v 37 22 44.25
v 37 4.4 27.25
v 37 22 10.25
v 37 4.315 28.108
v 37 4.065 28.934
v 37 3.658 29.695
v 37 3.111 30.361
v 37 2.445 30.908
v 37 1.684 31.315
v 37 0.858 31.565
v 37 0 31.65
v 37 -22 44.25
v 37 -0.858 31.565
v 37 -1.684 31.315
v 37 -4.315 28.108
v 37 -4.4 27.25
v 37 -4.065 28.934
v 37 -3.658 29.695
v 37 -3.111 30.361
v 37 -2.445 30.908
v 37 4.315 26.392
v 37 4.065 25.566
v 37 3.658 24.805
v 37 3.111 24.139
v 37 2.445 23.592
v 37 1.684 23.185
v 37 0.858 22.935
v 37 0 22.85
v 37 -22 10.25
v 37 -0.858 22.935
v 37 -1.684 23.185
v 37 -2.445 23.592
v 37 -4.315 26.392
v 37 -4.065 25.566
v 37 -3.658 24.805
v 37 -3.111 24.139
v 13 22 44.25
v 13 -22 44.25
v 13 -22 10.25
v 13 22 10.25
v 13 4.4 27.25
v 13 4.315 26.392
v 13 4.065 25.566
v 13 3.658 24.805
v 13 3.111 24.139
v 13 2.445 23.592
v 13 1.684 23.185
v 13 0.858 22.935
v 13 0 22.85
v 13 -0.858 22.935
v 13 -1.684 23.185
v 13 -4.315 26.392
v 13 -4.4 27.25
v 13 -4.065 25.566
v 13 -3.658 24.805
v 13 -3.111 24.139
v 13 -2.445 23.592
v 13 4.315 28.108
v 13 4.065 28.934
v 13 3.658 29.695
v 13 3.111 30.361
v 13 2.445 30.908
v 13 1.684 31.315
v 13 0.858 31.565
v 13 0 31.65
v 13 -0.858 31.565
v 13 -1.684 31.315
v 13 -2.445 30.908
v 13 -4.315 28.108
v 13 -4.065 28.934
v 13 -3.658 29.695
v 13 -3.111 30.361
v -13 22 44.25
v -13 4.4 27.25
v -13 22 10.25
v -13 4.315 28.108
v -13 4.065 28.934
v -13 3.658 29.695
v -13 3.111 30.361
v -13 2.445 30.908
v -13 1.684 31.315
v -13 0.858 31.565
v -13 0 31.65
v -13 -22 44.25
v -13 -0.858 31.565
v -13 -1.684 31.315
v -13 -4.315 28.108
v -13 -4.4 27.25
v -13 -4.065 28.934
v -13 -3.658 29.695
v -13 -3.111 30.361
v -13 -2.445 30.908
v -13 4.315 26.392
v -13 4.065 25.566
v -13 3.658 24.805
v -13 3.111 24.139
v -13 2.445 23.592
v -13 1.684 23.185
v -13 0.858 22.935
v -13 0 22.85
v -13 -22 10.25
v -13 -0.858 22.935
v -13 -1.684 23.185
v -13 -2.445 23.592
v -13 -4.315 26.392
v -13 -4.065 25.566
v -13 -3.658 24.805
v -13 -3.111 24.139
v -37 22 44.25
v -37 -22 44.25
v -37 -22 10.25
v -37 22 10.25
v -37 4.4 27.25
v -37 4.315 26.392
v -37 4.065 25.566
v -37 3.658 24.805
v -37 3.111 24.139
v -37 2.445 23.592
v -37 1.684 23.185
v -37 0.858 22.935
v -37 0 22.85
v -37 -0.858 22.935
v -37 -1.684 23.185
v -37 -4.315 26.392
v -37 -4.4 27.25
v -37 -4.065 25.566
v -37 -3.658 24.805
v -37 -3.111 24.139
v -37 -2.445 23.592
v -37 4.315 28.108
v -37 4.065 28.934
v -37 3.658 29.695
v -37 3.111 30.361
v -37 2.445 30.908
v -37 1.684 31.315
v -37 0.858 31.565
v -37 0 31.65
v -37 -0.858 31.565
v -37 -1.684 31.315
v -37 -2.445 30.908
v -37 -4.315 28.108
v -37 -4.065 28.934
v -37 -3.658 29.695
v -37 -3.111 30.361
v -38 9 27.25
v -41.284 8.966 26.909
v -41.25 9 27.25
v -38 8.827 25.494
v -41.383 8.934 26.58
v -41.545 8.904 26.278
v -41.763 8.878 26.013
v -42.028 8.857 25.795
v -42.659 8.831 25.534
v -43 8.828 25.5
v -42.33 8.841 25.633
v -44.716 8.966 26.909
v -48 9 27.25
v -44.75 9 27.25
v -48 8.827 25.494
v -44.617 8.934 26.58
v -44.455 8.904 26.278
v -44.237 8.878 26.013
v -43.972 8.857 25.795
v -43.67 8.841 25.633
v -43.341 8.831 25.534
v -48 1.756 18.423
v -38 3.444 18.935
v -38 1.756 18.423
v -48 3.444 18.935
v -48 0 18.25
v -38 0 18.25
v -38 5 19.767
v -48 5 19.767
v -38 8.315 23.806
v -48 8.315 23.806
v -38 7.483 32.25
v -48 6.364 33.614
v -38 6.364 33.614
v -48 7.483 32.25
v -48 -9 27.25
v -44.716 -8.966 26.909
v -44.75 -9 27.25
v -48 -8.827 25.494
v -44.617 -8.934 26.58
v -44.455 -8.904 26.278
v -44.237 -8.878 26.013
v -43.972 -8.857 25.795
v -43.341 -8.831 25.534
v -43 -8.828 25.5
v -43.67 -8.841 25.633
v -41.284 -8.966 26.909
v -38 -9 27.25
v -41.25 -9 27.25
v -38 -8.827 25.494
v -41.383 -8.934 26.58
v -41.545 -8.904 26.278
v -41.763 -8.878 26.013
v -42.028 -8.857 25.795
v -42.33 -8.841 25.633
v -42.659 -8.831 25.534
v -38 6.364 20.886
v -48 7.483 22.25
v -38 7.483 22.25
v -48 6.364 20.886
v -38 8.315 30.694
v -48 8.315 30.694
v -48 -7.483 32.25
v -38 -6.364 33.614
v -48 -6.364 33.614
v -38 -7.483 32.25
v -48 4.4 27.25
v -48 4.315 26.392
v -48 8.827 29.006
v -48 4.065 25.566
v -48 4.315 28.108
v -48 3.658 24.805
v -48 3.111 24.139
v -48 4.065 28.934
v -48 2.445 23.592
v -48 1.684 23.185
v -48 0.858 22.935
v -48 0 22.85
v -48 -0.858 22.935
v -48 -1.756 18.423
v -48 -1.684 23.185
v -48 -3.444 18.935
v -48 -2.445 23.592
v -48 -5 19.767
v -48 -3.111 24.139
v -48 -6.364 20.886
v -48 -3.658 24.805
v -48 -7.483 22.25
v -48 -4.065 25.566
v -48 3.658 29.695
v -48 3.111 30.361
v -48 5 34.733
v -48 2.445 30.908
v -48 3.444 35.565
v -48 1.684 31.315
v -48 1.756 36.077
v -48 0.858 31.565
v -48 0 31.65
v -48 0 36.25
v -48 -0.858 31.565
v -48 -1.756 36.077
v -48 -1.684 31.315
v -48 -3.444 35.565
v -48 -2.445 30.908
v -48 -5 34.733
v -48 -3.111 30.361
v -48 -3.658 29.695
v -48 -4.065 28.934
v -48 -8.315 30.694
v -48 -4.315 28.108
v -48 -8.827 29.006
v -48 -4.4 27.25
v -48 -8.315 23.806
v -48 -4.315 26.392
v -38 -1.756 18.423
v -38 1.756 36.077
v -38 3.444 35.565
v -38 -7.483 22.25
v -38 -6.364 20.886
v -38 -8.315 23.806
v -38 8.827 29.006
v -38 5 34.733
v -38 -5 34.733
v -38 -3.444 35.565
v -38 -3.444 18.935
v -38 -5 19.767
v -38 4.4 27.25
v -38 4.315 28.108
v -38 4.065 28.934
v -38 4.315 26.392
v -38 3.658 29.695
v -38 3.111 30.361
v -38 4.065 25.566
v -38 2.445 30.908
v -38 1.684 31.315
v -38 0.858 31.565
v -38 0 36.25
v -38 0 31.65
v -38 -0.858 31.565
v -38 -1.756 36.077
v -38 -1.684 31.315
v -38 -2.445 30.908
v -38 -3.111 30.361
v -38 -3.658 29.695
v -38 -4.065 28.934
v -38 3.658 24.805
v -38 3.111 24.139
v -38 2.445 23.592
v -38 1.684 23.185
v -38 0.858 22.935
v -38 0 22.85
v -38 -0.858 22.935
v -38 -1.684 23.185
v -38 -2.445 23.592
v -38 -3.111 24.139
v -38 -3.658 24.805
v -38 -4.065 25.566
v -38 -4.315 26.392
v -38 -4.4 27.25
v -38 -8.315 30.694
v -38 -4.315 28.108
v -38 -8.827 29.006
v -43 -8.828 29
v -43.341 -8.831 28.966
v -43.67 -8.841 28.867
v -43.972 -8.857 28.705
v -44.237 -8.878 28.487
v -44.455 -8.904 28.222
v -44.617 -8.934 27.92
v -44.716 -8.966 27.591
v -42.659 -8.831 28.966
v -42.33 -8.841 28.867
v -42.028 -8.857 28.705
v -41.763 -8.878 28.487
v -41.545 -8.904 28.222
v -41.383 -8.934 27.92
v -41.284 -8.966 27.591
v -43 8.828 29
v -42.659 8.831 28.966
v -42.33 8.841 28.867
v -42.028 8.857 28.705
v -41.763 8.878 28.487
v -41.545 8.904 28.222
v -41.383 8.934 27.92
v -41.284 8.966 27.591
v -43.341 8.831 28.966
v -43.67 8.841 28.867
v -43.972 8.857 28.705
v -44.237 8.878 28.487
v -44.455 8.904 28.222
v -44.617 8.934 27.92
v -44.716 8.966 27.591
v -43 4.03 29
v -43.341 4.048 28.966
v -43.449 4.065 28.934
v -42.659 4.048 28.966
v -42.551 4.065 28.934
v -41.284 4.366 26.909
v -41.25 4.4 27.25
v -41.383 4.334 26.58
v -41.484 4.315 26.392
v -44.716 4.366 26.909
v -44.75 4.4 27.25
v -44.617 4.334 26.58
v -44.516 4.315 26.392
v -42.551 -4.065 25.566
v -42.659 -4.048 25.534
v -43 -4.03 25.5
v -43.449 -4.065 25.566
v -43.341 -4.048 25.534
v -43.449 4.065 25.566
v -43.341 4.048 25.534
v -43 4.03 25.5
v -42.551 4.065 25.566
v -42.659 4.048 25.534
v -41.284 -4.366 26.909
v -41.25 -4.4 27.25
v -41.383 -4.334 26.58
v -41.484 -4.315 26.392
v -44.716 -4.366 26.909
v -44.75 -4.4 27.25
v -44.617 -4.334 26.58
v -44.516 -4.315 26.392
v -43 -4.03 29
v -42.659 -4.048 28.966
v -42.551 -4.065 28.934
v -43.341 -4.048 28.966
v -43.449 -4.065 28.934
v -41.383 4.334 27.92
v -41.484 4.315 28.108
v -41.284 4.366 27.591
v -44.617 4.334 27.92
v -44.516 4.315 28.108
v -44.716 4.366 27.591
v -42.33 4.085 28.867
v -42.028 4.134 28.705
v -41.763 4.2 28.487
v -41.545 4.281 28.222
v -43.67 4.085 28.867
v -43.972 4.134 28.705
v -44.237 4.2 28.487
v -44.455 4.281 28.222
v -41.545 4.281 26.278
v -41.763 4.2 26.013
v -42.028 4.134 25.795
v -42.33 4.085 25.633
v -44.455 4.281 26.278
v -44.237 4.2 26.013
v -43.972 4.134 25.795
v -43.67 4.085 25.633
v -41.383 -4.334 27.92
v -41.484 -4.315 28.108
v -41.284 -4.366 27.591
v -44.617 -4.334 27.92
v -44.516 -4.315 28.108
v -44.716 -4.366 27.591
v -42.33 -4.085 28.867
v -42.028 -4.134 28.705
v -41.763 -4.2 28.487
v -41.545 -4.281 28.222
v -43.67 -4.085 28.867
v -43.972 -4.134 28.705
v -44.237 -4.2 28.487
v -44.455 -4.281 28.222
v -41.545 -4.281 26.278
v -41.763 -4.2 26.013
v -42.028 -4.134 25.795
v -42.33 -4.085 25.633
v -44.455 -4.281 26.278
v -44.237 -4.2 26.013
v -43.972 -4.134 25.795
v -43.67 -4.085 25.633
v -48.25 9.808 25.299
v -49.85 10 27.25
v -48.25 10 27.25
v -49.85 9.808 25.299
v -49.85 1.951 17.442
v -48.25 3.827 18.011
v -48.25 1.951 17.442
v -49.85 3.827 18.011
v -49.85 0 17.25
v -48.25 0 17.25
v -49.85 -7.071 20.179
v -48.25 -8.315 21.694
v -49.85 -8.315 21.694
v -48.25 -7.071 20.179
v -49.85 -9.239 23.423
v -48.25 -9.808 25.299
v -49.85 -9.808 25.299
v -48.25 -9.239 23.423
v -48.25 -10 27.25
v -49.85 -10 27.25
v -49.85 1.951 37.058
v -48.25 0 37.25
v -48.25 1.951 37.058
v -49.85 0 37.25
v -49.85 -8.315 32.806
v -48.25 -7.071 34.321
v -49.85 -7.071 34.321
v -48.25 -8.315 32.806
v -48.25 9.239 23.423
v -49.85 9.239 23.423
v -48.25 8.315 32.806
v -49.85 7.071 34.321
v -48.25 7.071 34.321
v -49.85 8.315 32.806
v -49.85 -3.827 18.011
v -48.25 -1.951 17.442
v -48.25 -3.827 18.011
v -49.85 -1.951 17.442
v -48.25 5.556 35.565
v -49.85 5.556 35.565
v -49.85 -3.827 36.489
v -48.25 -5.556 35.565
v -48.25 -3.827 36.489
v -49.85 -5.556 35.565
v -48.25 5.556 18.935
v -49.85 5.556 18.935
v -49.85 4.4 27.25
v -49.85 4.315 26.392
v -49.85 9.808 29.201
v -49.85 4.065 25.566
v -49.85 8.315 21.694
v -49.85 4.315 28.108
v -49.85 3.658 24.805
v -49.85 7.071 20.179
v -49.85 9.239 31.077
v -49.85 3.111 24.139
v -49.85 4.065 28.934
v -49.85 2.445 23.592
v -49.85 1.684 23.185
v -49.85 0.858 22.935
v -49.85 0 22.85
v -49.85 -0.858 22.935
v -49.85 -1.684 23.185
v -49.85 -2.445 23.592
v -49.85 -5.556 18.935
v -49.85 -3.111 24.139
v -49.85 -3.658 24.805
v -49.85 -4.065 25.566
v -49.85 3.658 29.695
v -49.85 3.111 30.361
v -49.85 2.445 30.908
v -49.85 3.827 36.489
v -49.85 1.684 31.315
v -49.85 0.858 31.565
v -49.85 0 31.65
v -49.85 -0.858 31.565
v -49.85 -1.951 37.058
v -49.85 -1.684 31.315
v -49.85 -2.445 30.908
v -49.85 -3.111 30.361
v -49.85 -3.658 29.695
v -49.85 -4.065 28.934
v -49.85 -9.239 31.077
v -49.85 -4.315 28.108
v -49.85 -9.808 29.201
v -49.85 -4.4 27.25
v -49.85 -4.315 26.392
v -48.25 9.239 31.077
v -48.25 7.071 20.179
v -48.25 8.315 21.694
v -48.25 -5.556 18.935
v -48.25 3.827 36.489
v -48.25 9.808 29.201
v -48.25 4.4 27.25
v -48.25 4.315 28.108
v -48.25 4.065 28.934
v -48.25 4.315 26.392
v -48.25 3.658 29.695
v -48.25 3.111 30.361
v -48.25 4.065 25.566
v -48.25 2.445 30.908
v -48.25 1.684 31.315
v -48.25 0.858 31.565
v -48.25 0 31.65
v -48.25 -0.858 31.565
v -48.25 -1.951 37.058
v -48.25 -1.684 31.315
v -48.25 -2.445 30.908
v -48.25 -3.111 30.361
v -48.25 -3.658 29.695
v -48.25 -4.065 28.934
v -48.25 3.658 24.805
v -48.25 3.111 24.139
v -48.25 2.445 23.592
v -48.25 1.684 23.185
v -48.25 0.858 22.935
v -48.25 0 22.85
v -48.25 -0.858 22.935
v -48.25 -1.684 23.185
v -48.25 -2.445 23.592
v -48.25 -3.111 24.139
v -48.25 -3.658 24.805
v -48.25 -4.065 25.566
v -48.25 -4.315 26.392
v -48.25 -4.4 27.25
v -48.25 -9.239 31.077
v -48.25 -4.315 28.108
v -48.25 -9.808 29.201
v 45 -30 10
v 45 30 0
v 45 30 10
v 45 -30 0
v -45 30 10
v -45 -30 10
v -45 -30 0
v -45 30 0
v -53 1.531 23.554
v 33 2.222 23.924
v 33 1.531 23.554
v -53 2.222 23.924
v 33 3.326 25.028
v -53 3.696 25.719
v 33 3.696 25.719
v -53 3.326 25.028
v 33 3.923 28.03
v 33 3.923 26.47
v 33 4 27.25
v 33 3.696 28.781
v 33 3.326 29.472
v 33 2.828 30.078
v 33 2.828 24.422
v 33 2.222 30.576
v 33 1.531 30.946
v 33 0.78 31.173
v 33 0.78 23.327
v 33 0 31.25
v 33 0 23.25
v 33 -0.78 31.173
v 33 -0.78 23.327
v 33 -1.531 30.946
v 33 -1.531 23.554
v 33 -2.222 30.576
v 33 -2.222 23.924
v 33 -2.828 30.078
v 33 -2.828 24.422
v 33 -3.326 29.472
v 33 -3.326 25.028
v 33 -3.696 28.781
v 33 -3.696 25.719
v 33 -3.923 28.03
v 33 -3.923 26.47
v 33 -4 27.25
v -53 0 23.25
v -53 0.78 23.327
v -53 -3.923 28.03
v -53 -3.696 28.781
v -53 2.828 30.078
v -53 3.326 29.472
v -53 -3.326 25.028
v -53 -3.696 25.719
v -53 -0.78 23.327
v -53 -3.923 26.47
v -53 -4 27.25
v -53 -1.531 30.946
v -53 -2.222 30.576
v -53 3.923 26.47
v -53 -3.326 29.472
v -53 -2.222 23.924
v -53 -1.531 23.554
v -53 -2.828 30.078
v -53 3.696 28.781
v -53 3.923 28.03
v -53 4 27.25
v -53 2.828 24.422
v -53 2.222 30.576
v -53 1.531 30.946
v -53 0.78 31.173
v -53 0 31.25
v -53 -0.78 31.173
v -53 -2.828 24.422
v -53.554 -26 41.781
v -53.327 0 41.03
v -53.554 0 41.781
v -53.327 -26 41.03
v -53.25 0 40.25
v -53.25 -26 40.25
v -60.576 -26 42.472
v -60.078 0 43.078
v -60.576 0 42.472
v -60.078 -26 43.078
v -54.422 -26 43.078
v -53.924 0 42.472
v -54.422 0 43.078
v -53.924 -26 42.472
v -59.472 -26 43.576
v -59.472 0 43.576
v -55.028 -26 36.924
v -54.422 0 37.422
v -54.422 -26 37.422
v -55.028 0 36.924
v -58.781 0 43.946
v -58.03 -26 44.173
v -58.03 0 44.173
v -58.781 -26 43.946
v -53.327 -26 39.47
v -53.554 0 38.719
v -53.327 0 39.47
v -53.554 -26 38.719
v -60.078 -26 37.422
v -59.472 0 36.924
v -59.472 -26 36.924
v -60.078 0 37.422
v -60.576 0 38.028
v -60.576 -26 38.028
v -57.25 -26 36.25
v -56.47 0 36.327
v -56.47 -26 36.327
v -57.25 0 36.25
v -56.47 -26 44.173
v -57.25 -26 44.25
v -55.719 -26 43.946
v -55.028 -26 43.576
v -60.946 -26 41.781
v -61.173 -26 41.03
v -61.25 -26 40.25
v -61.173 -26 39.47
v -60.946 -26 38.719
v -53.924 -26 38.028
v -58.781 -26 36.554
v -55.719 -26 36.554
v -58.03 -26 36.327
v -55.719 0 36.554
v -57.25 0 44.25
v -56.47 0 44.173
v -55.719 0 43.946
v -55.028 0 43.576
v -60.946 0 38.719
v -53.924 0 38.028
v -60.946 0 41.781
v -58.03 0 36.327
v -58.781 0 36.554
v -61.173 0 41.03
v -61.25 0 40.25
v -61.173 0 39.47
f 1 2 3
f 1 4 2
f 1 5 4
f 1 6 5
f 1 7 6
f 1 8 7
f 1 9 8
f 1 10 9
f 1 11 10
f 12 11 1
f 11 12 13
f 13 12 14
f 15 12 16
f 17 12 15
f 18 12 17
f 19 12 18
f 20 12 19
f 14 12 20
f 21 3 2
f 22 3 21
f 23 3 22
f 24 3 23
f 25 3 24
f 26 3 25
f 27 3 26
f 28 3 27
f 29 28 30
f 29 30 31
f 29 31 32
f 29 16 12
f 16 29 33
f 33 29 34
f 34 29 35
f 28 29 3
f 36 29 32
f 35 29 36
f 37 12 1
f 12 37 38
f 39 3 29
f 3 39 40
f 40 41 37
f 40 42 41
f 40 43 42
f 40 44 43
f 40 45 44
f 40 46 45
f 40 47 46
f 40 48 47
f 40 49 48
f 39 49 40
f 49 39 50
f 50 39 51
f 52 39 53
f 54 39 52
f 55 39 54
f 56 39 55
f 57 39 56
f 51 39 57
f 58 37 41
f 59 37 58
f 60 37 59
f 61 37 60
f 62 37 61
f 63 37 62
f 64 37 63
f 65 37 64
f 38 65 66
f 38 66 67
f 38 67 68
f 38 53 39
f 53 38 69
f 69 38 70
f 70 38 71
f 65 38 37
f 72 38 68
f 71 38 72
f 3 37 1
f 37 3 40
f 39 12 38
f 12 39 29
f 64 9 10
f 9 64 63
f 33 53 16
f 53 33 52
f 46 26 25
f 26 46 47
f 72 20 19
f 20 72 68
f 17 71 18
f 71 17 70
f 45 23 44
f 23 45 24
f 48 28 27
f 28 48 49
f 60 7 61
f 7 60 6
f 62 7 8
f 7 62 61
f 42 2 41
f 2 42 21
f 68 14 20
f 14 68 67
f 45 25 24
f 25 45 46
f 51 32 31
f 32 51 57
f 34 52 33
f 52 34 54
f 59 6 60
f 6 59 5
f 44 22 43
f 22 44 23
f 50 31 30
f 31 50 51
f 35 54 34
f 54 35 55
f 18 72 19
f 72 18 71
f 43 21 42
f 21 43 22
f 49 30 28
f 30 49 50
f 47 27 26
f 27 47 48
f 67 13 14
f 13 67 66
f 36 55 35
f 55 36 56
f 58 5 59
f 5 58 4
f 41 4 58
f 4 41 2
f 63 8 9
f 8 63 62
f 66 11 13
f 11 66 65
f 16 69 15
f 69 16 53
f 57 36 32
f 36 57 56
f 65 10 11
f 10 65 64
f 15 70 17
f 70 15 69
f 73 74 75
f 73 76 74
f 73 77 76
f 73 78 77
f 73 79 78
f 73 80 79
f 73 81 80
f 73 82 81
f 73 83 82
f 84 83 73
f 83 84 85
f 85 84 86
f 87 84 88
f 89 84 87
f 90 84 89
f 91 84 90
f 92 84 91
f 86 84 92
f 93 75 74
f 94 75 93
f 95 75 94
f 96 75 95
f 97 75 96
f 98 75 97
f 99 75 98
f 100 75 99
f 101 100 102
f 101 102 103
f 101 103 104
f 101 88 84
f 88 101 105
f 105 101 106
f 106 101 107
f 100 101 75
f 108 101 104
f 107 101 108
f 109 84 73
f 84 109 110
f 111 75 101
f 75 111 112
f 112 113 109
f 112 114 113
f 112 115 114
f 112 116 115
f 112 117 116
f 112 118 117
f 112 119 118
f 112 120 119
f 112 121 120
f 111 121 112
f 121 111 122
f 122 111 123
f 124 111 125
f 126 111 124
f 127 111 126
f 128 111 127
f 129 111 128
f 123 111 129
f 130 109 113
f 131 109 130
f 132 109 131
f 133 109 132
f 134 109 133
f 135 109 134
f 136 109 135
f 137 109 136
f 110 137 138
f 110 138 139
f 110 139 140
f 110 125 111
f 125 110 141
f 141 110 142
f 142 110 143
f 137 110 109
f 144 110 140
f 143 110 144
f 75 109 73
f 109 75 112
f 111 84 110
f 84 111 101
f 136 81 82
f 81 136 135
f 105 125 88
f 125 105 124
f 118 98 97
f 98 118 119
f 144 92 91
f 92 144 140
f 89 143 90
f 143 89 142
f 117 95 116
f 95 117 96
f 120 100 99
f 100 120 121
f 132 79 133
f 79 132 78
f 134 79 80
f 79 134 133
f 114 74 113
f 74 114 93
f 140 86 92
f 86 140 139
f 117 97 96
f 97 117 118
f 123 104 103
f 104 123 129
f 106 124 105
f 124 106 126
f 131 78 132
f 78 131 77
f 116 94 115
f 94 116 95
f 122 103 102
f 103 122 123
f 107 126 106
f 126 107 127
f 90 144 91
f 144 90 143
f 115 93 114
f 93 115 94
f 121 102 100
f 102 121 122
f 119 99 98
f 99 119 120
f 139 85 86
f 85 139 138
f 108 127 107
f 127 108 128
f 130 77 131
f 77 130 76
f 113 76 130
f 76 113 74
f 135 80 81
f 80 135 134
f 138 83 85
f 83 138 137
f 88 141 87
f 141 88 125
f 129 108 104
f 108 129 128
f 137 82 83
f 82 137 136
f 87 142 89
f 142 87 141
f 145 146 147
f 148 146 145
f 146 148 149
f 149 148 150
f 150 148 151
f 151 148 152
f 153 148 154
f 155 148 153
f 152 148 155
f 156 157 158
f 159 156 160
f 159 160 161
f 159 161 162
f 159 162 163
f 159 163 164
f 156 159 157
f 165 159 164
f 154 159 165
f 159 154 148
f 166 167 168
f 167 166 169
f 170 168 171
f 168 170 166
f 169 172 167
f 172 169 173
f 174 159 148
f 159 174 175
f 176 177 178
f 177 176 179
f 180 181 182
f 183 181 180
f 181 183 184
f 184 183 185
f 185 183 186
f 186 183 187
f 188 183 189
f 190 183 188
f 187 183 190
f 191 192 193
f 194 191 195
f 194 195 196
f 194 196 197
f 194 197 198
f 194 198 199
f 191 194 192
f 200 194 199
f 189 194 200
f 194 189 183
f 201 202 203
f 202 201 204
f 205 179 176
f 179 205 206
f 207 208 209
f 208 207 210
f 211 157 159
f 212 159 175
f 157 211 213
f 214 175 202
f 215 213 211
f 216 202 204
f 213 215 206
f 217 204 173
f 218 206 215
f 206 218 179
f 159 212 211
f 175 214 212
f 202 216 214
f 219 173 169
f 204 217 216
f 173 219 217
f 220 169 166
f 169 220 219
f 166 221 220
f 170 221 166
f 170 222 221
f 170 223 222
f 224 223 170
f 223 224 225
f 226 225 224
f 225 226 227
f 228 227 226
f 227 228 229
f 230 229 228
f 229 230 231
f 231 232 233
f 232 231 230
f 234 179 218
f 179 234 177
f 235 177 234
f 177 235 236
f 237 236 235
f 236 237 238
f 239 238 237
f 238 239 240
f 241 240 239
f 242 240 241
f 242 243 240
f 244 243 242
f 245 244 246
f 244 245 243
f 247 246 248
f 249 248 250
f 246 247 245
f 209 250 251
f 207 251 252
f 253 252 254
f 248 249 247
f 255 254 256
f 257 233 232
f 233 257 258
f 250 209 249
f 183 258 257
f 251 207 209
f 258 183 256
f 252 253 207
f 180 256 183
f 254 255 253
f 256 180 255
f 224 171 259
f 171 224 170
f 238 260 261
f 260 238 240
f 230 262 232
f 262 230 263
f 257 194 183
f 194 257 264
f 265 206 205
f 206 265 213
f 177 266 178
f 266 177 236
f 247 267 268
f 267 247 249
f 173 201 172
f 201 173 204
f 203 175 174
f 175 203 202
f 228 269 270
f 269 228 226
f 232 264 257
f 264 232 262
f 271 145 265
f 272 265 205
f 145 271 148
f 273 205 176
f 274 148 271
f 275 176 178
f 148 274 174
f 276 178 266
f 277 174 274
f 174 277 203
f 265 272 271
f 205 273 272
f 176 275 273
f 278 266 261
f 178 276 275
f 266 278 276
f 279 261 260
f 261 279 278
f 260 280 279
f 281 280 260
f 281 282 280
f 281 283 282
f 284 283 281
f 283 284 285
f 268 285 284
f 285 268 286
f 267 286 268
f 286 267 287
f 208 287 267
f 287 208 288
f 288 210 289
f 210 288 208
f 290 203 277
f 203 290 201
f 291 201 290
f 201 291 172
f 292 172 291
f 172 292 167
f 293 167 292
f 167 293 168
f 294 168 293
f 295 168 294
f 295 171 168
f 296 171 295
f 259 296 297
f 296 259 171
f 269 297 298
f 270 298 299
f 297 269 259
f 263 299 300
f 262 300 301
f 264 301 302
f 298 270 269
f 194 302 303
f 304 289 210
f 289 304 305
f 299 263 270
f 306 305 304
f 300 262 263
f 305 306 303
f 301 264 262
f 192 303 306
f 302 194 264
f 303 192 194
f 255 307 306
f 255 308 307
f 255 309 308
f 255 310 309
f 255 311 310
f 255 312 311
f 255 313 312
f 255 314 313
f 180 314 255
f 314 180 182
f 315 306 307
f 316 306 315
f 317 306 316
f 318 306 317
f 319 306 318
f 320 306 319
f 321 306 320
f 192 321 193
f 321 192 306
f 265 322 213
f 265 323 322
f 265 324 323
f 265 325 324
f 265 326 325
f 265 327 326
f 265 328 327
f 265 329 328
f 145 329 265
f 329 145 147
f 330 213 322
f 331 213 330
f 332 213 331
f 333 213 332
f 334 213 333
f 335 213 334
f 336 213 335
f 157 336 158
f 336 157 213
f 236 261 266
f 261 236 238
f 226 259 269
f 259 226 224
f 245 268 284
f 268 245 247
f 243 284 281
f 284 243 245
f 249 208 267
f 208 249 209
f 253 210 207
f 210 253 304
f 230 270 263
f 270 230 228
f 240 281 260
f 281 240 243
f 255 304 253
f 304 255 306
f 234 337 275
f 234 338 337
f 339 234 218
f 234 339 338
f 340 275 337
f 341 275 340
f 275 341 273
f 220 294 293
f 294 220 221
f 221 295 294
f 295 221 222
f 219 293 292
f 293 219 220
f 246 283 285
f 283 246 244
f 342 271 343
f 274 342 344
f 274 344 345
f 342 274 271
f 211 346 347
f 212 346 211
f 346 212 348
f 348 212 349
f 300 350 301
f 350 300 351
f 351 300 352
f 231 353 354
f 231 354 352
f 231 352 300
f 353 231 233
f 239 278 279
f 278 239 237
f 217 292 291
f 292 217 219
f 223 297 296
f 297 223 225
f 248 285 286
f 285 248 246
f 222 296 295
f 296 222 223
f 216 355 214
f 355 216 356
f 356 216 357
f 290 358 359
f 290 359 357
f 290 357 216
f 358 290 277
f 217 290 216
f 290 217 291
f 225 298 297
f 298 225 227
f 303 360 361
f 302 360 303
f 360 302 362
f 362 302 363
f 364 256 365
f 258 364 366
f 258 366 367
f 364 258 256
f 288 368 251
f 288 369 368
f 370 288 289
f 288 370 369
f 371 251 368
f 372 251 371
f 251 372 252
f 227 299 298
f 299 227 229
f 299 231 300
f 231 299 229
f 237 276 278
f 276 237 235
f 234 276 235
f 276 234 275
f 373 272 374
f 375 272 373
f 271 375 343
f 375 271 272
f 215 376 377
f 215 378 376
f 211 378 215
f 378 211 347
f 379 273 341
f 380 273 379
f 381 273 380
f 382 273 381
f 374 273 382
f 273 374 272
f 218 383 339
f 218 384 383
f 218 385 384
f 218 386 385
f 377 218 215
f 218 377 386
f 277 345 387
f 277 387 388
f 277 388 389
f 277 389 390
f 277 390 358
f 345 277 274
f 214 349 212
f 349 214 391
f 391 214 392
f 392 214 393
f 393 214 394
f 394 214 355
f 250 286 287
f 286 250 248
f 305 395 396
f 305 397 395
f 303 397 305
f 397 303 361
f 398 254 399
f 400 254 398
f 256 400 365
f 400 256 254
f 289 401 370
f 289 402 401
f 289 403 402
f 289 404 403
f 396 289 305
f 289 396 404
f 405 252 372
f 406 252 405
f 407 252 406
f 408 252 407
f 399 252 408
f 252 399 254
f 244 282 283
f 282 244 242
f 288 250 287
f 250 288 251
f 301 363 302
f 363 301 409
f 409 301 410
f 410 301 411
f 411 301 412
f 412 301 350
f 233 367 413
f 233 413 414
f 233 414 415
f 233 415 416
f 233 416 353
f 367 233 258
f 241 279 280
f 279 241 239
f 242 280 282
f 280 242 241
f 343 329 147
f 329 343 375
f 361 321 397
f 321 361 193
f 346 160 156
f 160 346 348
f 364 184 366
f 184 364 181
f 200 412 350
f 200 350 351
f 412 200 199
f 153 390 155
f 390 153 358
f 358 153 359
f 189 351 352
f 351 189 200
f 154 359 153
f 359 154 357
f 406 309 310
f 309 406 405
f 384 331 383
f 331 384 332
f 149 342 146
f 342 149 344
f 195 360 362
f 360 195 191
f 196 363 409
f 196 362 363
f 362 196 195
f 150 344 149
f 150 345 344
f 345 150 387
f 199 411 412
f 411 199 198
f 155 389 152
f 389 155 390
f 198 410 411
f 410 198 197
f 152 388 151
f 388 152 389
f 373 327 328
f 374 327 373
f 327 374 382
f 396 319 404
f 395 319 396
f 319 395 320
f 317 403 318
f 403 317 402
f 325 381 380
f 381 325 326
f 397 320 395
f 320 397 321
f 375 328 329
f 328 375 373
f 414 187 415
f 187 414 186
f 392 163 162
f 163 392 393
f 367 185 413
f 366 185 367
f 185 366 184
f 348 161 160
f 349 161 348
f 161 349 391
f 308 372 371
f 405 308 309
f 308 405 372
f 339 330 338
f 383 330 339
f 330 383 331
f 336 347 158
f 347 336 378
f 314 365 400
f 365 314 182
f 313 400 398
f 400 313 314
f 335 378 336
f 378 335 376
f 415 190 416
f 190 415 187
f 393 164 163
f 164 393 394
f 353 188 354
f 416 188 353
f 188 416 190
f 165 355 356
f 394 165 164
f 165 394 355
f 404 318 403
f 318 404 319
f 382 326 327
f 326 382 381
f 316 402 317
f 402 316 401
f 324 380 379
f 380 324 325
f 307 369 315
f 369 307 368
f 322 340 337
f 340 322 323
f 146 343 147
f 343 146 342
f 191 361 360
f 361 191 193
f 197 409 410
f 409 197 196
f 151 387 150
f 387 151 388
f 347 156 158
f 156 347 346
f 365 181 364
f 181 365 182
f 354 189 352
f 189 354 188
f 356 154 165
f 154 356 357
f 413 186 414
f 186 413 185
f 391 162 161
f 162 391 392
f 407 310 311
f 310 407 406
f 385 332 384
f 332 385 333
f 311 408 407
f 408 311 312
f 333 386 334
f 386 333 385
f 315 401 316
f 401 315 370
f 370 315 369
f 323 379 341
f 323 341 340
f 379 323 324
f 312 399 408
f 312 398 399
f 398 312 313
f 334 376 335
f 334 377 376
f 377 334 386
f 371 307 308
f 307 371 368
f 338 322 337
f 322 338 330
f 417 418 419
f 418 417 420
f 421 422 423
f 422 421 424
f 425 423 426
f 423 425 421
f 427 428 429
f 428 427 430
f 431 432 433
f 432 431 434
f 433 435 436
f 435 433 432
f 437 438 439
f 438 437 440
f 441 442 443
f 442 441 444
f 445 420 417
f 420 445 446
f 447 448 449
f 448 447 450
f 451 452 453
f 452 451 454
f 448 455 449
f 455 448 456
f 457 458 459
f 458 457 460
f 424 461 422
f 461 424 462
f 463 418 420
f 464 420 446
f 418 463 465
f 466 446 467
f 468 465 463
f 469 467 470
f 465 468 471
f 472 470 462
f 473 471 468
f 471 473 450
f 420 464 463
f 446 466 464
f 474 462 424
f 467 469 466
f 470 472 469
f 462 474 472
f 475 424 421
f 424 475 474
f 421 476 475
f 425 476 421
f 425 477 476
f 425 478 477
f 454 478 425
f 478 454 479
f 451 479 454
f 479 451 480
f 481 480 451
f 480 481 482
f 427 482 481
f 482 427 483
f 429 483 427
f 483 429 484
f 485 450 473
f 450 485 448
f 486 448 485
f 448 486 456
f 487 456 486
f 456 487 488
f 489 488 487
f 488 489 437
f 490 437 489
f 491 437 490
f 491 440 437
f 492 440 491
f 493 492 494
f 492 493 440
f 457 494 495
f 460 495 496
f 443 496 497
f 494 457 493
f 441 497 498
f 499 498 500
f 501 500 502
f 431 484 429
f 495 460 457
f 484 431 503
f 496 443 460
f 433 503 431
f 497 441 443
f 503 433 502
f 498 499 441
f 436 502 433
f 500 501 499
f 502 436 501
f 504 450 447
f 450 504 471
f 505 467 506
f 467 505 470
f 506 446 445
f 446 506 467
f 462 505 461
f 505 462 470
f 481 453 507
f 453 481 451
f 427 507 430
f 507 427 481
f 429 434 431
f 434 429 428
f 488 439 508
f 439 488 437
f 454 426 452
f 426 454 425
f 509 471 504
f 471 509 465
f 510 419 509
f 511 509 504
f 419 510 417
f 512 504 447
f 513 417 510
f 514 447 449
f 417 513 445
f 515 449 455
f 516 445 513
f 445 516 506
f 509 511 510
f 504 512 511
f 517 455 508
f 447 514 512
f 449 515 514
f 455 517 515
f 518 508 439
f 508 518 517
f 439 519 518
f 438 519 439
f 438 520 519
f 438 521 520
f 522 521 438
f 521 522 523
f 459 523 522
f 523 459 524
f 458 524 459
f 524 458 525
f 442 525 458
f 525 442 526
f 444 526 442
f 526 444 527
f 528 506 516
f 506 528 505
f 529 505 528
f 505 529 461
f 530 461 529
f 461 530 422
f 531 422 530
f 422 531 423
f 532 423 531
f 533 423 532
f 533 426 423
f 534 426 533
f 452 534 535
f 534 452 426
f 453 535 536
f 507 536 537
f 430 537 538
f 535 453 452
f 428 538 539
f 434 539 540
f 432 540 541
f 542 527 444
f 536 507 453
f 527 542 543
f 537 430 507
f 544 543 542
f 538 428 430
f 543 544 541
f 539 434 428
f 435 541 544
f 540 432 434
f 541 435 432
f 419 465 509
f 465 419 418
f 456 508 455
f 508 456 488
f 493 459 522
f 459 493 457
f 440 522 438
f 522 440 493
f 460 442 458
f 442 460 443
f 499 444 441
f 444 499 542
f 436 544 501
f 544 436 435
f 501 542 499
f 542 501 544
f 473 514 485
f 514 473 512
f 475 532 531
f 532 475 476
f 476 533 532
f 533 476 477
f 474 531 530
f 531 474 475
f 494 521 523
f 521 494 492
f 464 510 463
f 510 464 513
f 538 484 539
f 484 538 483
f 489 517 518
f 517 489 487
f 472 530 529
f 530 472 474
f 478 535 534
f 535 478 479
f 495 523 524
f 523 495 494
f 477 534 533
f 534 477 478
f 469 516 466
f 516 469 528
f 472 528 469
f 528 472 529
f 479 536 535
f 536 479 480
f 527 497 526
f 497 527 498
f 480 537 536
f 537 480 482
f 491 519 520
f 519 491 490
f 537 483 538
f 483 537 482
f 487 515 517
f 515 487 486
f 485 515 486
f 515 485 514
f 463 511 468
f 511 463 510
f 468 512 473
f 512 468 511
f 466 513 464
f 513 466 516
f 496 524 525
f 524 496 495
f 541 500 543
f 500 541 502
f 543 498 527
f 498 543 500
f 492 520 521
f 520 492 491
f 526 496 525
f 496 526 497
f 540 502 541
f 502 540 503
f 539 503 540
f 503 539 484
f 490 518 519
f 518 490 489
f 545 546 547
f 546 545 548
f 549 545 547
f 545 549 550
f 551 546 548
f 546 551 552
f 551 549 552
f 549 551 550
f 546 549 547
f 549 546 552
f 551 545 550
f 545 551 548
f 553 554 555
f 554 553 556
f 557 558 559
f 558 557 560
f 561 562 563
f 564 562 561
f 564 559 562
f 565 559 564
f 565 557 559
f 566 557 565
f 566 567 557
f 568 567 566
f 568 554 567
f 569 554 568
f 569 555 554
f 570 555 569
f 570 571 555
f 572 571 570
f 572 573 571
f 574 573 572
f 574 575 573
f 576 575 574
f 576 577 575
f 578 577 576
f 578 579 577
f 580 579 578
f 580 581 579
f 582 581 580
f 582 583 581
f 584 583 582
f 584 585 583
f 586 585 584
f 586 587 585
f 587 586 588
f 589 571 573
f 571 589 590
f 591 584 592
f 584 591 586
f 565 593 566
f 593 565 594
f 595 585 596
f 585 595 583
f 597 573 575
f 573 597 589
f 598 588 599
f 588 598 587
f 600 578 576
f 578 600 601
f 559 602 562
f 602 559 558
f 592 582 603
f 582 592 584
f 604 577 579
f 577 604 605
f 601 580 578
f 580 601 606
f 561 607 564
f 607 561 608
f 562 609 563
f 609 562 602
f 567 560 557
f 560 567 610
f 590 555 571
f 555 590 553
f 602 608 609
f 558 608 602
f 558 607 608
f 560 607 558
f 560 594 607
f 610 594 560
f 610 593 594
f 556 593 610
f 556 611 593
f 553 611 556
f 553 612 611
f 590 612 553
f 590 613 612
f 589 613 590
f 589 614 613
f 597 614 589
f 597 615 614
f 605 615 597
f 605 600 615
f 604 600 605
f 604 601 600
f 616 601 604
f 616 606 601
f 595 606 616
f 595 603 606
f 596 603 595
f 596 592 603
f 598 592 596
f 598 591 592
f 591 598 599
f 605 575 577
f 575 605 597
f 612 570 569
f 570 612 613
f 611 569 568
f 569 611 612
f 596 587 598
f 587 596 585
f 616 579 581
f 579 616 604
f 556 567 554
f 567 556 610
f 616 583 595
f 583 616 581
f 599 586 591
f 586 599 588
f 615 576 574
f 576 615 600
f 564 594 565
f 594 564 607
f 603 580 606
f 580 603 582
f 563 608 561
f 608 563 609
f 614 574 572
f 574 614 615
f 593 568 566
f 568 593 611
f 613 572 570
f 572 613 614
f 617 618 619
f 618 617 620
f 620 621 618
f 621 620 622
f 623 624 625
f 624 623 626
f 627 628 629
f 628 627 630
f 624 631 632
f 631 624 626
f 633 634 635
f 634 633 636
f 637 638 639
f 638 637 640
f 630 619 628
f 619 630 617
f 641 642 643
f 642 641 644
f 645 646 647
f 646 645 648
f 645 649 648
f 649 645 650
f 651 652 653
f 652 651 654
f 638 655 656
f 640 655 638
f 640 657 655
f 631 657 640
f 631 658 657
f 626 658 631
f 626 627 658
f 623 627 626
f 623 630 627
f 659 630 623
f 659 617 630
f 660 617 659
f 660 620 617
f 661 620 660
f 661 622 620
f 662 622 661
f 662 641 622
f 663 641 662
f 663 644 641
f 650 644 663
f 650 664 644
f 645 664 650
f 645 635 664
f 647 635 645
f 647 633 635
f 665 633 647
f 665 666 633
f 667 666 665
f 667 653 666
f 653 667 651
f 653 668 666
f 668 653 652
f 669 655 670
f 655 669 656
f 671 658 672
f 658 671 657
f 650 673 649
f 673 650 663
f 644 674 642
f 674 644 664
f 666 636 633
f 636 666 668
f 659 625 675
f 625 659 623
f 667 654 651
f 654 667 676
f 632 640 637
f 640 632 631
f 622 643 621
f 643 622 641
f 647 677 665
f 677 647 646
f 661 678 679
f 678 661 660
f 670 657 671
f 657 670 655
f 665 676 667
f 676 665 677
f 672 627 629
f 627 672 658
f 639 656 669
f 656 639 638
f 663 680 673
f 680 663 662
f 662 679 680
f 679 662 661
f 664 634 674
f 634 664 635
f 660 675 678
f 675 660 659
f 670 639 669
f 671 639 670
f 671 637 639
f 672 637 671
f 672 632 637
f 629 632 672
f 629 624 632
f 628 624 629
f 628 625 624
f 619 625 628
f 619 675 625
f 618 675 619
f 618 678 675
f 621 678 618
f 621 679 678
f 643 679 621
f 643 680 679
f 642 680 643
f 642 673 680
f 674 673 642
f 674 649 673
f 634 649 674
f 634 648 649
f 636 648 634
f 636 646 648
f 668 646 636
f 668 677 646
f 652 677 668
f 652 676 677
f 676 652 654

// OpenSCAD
$fn = 32;

// ------------------------------------------------------------------------
// Machine vise: screw d8, jaws 24 x 34 mm
// Every part is its own module, assembly() places every instance.
// ------------------------------------------------------------------------

// --- part 1 ---
module vise_bed() {
  difference() {
    translate([-45, -30, 0]) cube([90, 60, 10]);
  }
}

// --- part 2 ---
module vise_jaw() {
  difference() {
    translate([-12, -22, 0]) cube([24, 44, 34]);
    translate([0, 0, 17]) rotate([0, 90, 0]) cylinder(h = 26, d = 8.8, center = true);
  }
}

// --- part 3 ---
module vise_screw() {
  translate([0, 0, -43]) cylinder(h = 86, d = 8);
}

// --- part 4 ---
module screw_collar() {
  difference() {
    cylinder(h = 10, d = 18);
    translate([0, 0, -1]) cylinder(h = 12, d = 8.8);
    translate([0, 0, 5]) rotate([90, 0, 0]) cylinder(h = 20, d = 3.5, center = true);
  }
}

// --- part 5 ---
module screw_washer() {
  difference() {
      translate([0, 0, 0]) cylinder(h = 1.6, d = 20);
      translate([0, 0, -1]) cylinder(h = 3.6, d = 8.8);
    }
}

// --- part 6 ---
module vise_handle() {
  cylinder(h = 26, d = 8);
}

// --- assembly ---
module assembly() {
  color([0.80, 0.24, 0.20]) translate([0, 0, 0]) rotate([0, 0, 0]) vise_bed();
  color([0.20, 0.45, 0.75]) translate([25, 0, 10.25]) rotate([0, 0, 0]) vise_jaw();
  color([0.25, 0.62, 0.32]) translate([-25, 0, 10.25]) rotate([0, 0, 0]) vise_jaw();
  color([0.92, 0.70, 0.18]) translate([-10, 0, 27.25]) rotate([0, 90, 0]) vise_screw();
  color([0.58, 0.35, 0.70]) translate([-48, 0, 27.25]) rotate([0, 90, 0]) screw_collar();
  color([0.16, 0.66, 0.66]) translate([-49.85, 0, 27.25]) rotate([0, 90, 0]) screw_washer();
  color([0.85, 0.48, 0.18]) translate([-57.25, 0, 40.25]) rotate([90, 0, 0]) vise_handle();
}

assembly();
